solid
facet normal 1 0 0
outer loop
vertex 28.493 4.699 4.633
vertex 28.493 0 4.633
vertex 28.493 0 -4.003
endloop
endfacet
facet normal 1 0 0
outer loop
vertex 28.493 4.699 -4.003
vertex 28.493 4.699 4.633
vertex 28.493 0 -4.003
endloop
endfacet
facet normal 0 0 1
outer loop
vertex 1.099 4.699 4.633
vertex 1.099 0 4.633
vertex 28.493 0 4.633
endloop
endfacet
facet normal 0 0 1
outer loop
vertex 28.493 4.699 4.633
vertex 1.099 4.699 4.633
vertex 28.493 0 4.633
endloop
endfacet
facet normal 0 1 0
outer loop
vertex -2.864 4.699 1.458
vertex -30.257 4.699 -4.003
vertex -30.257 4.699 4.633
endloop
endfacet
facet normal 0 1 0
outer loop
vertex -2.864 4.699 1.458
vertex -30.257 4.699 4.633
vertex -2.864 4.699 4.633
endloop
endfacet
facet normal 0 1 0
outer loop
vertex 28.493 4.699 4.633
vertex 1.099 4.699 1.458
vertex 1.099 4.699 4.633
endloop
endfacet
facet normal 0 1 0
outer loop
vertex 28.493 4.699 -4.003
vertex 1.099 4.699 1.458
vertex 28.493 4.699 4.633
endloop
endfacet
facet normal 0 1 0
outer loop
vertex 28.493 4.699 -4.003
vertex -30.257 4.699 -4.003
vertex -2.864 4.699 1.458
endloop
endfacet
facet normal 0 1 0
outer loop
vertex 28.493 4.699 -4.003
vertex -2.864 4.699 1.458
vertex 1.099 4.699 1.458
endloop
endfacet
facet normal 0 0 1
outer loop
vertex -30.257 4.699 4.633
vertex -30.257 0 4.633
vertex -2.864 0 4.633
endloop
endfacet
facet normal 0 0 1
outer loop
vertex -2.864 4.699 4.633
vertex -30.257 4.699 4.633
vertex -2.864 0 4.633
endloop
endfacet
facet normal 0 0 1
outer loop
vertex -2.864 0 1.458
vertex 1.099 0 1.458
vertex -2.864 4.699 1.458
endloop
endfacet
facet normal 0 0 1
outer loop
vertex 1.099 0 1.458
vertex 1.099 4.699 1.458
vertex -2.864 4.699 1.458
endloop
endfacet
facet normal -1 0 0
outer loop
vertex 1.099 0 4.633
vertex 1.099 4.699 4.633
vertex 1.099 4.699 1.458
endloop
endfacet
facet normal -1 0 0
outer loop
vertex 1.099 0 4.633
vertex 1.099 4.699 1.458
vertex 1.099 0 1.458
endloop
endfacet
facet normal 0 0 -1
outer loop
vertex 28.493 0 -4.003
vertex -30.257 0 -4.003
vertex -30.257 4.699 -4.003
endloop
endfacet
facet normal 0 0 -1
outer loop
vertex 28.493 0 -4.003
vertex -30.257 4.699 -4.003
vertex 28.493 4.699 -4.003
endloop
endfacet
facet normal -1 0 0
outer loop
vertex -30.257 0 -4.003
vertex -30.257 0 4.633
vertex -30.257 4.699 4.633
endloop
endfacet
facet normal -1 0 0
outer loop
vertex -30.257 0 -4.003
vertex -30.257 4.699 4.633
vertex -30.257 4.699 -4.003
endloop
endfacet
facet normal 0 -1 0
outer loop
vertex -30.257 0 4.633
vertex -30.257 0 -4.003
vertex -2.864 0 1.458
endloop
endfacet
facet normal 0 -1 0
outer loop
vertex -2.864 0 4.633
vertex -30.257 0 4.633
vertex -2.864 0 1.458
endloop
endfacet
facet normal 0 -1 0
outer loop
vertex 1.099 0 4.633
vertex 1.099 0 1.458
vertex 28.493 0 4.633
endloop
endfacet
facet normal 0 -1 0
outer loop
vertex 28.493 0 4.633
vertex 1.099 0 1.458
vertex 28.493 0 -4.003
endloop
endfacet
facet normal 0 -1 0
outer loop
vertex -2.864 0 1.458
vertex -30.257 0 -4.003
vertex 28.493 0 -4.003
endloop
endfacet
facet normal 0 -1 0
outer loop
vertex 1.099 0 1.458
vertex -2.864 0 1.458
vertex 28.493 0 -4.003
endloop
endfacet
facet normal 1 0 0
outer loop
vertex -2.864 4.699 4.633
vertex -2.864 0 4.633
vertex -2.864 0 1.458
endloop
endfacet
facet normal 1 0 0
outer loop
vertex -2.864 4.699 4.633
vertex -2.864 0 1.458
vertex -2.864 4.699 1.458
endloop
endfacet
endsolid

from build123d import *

# Parameters (mm, degrees)
SKETCH2_W               = 58.7502
SKETCH2_H               = 8.636
BOSS_EXTRUDE1_DEPTH     = 4.699
CUT_EXTRUDE1_DEPTH      = 1
CUT_EXTRUDE1_DEPTH_BACK = 3.175


with BuildPart() as part:
    # Sketch2 → Boss-Extrude1 (new body)
    with BuildSketch(Plane(origin=(0, 0, 0), x_dir=(1, 0, 0), z_dir=(0, 1, 0))):
        with Locations((-0.882327606, -0.31486737)):
            Rectangle(SKETCH2_W, SKETCH2_H)
    extrude(amount=BOSS_EXTRUDE1_DEPTH)

    # Sketch5 → Cut-Extrude1 (cut, two sides)
    with BuildSketch(Plane.XY.offset(4.63286737)) as cut_extrude1_sk:
        Polygon((-0.882327606, 0), (-2.863527606, 0), (-2.863527606, 4.699), (1.098872394, 4.699), (1.098872394, 0), align=None)
    extrude(amount=CUT_EXTRUDE1_DEPTH, mode=Mode.SUBTRACT)
    extrude(cut_extrude1_sk.sketch, amount=-CUT_EXTRUDE1_DEPTH_BACK, mode=Mode.SUBTRACT)


solid = part.part
